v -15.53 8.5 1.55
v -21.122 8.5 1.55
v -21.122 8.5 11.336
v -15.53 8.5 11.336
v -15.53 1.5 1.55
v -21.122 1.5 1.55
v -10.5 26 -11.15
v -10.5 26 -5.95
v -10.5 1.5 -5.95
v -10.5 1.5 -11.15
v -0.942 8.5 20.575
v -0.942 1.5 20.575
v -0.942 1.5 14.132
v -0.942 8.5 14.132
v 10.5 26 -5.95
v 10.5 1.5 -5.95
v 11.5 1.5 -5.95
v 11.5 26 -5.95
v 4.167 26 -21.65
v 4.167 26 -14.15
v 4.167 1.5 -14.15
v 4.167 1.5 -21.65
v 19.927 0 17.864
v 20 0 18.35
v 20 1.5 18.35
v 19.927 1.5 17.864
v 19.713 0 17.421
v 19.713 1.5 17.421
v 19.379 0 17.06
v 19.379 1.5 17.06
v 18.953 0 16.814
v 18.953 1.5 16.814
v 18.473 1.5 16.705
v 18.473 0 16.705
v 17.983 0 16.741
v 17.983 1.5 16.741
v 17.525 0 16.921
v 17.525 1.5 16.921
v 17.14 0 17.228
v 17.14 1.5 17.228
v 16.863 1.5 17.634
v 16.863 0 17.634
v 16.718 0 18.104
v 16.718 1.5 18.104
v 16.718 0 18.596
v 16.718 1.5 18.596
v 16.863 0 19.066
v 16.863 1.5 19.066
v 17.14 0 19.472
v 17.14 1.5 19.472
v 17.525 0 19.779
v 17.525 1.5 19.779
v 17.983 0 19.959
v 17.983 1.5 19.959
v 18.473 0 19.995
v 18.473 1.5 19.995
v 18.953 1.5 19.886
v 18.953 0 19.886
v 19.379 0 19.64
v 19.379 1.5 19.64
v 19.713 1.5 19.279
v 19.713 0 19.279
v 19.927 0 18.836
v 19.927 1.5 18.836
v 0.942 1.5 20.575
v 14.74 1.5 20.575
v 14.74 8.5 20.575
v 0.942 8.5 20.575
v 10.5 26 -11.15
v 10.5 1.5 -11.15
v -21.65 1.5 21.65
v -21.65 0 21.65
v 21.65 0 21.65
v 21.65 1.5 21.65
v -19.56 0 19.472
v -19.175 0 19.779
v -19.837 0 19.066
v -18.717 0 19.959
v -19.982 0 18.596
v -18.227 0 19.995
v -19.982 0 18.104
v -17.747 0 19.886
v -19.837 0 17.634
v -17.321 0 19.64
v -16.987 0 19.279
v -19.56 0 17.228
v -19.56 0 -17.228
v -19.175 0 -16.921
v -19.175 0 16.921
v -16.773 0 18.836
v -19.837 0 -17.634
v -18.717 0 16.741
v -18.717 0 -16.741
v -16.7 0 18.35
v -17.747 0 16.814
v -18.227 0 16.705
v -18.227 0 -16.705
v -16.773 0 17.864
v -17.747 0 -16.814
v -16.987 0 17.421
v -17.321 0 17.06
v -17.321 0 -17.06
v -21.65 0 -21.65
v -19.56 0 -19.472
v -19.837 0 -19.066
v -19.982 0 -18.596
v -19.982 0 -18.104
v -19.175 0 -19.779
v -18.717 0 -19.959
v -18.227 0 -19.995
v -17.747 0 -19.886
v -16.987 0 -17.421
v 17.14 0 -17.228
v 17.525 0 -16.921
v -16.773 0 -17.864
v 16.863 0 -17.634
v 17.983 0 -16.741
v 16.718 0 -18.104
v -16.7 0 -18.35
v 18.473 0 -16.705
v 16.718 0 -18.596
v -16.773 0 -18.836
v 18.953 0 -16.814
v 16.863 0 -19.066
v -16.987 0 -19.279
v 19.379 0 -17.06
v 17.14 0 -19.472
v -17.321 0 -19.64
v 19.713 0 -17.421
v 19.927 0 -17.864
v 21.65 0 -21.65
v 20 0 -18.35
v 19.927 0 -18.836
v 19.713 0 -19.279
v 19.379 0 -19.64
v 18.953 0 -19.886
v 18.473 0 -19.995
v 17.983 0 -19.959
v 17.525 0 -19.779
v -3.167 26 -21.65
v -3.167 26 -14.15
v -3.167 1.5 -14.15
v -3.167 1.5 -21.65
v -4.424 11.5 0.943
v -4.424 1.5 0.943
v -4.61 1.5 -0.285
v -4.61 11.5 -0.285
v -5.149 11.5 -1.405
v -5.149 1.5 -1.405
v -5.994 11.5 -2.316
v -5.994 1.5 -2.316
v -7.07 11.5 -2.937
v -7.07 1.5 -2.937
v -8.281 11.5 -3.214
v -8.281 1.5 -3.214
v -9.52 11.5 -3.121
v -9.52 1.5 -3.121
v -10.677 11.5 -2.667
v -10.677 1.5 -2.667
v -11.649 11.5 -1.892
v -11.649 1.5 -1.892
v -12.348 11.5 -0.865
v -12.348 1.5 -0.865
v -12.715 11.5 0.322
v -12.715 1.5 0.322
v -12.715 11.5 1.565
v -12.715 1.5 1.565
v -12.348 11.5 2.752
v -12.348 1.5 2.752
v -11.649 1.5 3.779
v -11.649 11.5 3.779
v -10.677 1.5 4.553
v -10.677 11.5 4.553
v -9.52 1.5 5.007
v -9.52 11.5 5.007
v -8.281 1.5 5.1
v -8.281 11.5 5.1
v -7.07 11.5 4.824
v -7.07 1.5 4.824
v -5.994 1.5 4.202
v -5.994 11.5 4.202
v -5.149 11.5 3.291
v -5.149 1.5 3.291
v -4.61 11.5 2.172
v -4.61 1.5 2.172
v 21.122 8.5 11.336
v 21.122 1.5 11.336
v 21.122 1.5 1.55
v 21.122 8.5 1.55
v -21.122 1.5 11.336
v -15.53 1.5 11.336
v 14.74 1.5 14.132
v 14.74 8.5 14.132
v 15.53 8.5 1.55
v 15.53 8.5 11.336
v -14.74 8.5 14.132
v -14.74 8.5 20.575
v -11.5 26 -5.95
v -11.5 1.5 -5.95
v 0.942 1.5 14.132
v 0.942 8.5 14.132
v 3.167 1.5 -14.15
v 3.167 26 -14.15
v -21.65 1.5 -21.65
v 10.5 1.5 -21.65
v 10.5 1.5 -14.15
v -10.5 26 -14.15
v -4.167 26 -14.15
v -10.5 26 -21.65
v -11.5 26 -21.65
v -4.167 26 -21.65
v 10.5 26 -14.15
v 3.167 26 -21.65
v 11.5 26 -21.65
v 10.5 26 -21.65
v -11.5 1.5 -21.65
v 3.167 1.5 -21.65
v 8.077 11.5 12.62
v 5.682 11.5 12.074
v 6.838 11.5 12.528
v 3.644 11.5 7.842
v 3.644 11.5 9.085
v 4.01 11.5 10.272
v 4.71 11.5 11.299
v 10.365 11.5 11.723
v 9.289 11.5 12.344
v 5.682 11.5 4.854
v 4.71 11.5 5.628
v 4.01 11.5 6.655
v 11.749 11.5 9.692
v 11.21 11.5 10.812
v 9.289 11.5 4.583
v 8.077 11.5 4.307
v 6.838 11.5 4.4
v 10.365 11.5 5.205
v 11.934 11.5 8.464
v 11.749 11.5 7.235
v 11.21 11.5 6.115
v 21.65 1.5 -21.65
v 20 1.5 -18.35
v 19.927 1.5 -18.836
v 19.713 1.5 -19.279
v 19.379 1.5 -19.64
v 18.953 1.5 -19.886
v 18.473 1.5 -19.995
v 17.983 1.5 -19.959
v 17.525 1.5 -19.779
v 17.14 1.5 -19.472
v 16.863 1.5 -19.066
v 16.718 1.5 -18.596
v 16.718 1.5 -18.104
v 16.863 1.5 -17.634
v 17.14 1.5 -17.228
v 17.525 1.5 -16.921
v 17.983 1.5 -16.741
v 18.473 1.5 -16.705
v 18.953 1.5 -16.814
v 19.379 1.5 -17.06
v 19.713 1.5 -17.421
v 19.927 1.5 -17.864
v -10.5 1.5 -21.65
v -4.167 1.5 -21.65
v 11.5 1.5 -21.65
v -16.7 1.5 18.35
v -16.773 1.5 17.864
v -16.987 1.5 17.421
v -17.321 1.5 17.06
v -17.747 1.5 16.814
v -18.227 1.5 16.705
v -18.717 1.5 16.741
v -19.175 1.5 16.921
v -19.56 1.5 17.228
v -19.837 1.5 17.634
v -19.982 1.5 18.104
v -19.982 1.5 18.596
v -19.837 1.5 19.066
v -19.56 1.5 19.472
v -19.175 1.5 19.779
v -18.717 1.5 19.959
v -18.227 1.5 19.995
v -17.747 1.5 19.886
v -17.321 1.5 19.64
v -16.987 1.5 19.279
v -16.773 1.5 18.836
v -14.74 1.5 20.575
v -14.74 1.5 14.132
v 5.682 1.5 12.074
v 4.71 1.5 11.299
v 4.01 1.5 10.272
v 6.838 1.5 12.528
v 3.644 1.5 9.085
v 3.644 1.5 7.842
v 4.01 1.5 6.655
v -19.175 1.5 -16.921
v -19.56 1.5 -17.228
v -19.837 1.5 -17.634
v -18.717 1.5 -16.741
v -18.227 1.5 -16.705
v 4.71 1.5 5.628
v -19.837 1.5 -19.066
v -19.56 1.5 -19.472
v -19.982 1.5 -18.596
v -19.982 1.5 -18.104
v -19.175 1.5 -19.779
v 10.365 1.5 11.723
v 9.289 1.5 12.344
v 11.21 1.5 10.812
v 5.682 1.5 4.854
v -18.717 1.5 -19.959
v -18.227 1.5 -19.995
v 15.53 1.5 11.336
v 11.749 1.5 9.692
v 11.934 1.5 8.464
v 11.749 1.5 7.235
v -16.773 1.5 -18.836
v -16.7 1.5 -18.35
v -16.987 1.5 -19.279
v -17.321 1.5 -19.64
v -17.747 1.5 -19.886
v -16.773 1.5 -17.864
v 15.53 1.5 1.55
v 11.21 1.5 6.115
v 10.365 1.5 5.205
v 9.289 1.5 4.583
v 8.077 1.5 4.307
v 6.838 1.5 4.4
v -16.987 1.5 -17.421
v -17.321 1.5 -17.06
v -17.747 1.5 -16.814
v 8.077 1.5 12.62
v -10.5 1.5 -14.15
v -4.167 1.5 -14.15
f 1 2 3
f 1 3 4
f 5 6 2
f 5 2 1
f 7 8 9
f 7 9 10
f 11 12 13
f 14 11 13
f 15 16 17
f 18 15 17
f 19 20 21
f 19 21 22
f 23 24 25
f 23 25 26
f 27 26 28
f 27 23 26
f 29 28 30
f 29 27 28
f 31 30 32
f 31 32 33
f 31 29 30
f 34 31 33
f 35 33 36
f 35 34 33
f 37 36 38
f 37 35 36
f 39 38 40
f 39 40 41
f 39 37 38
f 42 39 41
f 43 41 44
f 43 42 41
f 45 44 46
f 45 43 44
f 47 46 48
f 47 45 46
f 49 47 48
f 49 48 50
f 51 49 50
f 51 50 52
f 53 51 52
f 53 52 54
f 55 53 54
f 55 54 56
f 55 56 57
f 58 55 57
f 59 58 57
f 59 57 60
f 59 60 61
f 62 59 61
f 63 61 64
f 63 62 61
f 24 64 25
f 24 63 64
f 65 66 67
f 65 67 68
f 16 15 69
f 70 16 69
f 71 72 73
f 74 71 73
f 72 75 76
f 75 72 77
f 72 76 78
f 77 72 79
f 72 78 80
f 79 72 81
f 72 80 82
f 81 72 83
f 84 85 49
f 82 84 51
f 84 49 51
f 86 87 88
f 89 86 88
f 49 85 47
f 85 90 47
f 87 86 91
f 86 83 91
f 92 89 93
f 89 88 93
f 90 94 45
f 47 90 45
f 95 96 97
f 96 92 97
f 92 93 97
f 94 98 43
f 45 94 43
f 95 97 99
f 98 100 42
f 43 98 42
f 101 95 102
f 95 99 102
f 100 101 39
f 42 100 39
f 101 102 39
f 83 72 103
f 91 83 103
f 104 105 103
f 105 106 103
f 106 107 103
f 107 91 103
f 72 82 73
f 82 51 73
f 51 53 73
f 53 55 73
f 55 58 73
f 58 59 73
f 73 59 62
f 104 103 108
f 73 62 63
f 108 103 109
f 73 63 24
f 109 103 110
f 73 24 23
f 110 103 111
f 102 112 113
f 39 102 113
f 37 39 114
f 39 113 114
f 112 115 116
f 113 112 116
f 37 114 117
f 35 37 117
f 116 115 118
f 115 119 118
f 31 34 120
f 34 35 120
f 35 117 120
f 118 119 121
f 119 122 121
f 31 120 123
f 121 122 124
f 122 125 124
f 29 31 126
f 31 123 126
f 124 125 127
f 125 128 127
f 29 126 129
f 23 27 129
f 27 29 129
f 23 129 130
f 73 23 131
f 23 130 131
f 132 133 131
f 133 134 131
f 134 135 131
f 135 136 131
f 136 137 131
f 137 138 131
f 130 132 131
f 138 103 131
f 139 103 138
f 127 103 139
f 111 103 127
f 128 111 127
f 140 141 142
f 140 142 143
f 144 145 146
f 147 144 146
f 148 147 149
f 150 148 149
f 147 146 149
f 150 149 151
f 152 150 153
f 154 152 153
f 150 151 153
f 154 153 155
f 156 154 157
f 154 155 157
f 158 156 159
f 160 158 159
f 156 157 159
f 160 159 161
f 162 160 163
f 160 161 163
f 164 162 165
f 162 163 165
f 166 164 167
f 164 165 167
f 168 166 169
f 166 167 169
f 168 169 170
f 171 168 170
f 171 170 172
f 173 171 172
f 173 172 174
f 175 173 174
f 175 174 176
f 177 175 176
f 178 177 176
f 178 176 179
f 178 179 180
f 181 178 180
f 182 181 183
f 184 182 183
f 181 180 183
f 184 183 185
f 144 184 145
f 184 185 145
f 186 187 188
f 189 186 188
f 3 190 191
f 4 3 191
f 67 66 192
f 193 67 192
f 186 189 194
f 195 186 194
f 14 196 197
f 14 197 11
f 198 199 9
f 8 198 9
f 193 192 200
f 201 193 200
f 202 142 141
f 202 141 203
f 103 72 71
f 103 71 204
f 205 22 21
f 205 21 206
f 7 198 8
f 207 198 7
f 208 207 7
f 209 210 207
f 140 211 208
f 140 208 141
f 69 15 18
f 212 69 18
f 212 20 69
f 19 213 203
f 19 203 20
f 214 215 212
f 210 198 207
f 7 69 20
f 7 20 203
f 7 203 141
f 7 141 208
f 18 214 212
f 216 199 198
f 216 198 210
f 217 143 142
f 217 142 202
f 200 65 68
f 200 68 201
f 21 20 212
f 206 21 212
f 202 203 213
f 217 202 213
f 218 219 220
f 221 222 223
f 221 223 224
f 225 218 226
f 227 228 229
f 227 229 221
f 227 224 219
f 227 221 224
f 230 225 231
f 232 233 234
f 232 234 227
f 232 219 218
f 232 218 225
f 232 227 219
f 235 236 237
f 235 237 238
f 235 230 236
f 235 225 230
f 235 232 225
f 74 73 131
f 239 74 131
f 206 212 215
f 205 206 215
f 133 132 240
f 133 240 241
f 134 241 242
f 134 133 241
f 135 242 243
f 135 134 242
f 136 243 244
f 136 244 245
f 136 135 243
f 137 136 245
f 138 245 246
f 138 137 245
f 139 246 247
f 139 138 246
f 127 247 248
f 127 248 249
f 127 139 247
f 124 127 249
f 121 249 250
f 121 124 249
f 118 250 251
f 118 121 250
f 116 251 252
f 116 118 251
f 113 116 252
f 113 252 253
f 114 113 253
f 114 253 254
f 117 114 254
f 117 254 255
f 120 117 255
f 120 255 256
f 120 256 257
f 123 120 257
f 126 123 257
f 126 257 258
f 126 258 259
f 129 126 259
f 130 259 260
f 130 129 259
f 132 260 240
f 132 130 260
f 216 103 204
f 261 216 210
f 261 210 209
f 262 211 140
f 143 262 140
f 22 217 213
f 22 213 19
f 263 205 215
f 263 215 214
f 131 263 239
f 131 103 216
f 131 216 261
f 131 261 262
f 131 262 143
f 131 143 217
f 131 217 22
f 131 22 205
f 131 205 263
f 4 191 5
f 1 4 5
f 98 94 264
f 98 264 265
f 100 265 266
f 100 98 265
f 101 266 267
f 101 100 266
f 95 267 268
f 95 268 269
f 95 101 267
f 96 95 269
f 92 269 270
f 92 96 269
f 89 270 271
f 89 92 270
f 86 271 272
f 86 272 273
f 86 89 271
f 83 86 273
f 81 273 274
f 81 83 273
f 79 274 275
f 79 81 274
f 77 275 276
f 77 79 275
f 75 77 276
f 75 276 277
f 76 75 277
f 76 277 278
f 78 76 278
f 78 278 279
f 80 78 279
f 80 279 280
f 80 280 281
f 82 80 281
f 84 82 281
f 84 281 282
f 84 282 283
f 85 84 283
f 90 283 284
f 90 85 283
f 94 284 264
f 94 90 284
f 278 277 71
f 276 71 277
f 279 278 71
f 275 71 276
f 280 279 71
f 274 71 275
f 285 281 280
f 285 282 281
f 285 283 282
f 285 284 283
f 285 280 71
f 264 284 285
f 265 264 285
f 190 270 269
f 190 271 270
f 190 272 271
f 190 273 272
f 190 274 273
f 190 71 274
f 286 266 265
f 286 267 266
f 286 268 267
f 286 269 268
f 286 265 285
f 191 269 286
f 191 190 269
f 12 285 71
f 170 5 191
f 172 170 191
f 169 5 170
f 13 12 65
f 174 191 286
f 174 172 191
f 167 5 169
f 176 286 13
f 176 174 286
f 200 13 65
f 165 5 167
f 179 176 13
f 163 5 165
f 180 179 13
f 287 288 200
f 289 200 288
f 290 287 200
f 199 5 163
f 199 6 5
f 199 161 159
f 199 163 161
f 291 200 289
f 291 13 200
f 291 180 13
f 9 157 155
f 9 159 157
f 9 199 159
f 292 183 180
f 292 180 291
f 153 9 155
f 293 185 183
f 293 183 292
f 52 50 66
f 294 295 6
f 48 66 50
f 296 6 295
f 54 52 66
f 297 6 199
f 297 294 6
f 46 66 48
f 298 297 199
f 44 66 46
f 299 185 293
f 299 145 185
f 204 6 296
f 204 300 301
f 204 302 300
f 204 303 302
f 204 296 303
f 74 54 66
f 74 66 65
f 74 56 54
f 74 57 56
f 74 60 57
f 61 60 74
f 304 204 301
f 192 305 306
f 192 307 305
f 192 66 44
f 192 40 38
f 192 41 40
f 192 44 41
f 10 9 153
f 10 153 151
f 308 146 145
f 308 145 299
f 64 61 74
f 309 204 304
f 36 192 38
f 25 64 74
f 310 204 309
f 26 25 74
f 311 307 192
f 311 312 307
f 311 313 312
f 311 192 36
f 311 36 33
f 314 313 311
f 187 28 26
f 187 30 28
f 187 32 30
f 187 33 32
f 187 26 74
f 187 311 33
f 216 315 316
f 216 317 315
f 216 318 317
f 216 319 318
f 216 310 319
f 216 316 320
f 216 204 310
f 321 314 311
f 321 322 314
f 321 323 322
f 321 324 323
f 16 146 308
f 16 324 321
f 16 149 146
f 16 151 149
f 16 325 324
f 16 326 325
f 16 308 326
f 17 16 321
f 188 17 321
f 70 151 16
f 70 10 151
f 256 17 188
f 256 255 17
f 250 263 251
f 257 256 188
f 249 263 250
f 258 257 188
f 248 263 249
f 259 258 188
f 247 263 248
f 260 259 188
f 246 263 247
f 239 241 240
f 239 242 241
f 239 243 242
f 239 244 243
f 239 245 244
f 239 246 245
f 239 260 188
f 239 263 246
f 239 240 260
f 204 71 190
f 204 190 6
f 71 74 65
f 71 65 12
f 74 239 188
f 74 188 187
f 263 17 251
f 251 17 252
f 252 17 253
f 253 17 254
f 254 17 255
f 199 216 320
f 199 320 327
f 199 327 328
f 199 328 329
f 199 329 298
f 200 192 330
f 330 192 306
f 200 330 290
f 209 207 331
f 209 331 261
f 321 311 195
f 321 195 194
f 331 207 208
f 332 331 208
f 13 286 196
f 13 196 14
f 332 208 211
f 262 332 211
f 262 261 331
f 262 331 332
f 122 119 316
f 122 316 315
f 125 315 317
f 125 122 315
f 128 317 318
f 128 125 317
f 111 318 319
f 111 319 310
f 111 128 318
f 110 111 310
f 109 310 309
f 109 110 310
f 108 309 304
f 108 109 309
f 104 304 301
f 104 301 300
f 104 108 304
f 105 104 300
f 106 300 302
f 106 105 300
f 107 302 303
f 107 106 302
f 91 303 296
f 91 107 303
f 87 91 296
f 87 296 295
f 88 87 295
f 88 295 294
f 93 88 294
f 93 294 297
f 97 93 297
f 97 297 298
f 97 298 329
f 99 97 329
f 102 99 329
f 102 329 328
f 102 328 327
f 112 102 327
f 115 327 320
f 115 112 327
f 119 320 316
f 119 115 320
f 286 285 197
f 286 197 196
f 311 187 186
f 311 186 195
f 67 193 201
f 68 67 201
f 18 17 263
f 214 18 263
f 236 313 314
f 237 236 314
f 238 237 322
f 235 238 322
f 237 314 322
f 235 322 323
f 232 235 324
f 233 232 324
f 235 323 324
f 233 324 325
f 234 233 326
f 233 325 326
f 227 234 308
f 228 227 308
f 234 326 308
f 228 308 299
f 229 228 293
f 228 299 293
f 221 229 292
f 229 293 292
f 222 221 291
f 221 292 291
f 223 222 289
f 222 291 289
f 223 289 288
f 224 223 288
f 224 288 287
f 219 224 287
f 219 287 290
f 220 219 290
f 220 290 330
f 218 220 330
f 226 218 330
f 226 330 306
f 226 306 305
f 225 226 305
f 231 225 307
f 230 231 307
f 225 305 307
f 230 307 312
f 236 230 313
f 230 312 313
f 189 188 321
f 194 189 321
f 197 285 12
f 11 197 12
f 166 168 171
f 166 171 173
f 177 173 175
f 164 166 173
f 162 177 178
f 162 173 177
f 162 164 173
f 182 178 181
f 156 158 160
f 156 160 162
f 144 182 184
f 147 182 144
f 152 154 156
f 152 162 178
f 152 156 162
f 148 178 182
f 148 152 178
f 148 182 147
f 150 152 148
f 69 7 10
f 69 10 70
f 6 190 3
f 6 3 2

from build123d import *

# Parameters (mm, degrees)
SKETCH1_W           = 43.3
SKETCH1_H           = 43.3
SKETCH1_R           = 1.65
BOSS_EXTRUDE1_DEPTH = 1.5
SKETCH2_W           = 23
SKETCH2_H           = 15.7
BOSS_EXTRUDE2_DEPTH = 24.5
SKETCH3_W           = 5.591942039
SKETCH3_H           = 9.785898568
SKETCH3_W_2         = 13.797509161
SKETCH3_H_2         = 6.44288974
BOSS_EXTRUDE3_DEPTH = 7
SKETCH4_R           = 4.168434161
BOSS_EXTRUDE4_DEPTH = 10
SKETCH5_W           = 21
SKETCH5_H           = 5.2
SKETCH5_W_2         = 6.333333334
SKETCH5_H_2         = 15
SKETCH5_W_3         = 6.333333333
CUT_EXTRUDE1_DEPTH  = 24.5


with BuildPart() as part:
    # Sketch1 → Boss-Extrude1 (new body)
    with BuildSketch(Plane(origin=(0, 0, 0), x_dir=(1, 0, 0), z_dir=(0, 1, 0))):
        Rectangle(SKETCH1_W, SKETCH1_H)
        with Locations((-18.35, 18.35)):
            Circle(SKETCH1_R, mode=Mode.SUBTRACT)
        with Locations((18.35, 18.35)):
            Circle(SKETCH1_R, mode=Mode.SUBTRACT)
        with Locations((-18.35, -18.35)):
            Circle(SKETCH1_R, mode=Mode.SUBTRACT)
        with Locations((18.35, -18.35)):
            Circle(SKETCH1_R, mode=Mode.SUBTRACT)
    extrude(amount=BOSS_EXTRUDE1_DEPTH)

    # Sketch2 → Boss-Extrude2 (add)
    with BuildSketch(Plane(origin=(0, 1.5, 0), x_dir=(1, 0, 0), z_dir=(0, 1, 0))):
        with Locations((0, 13.8)):
            Rectangle(SKETCH2_W, SKETCH2_H)
    extrude(amount=BOSS_EXTRUDE2_DEPTH)

    # Sketch3 → Boss-Extrude3 (add)
    with BuildSketch(Plane(origin=(0, 1.5, 0), x_dir=(1, 0, 0), z_dir=(0, 1, 0))):
        with Locations((-18.325766573, -6.44288974)):
            Rectangle(SKETCH3_W, SKETCH3_H)
        with Locations((-7.84087525, -17.353254914)):
            Rectangle(SKETCH3_W_2, SKETCH3_H_2)
    boss_extrude3 = extrude(amount=BOSS_EXTRUDE3_DEPTH)

    # Mirror1: Boss-Extrude3 across plane
    add(boss_extrude3.mirror(Plane(origin=(0, 0, 0), x_dir=(0, 0, 1), z_dir=(1, 0, 0))))

    # Sketch4 → Boss-Extrude4 (add)
    with BuildSketch(Plane(origin=(0, 1.5, 0), x_dir=(1, 0, 0), z_dir=(0, 1, 0))):
        with Locations((-8.592825404, -0.943272563)):
            Circle(SKETCH4_R)
        with Locations((7.765846719, -8.463609984)):
            Circle(SKETCH4_R)
    extrude(amount=BOSS_EXTRUDE4_DEPTH)

    # Sketch5 → Cut-Extrude1 (cut)
    with BuildSketch(Plane(origin=(0, 26, 0), x_dir=(1, 0, 0), z_dir=(0, 1, 0))):
        with Locations((0, 8.55)):
            Rectangle(SKETCH5_W, SKETCH5_H)
        with Locations((0, 21.65)):
            Rectangle(SKETCH5_W_2, SKETCH5_H_2)
        with Locations((7.333333334, 21.65)):
            Rectangle(SKETCH5_W_3, SKETCH5_H_2)
        with Locations((-7.333333334, 21.65)):
            Rectangle(SKETCH5_W_3, SKETCH5_H_2)
    extrude(amount=-CUT_EXTRUDE1_DEPTH, mode=Mode.SUBTRACT)


solid = part.part
